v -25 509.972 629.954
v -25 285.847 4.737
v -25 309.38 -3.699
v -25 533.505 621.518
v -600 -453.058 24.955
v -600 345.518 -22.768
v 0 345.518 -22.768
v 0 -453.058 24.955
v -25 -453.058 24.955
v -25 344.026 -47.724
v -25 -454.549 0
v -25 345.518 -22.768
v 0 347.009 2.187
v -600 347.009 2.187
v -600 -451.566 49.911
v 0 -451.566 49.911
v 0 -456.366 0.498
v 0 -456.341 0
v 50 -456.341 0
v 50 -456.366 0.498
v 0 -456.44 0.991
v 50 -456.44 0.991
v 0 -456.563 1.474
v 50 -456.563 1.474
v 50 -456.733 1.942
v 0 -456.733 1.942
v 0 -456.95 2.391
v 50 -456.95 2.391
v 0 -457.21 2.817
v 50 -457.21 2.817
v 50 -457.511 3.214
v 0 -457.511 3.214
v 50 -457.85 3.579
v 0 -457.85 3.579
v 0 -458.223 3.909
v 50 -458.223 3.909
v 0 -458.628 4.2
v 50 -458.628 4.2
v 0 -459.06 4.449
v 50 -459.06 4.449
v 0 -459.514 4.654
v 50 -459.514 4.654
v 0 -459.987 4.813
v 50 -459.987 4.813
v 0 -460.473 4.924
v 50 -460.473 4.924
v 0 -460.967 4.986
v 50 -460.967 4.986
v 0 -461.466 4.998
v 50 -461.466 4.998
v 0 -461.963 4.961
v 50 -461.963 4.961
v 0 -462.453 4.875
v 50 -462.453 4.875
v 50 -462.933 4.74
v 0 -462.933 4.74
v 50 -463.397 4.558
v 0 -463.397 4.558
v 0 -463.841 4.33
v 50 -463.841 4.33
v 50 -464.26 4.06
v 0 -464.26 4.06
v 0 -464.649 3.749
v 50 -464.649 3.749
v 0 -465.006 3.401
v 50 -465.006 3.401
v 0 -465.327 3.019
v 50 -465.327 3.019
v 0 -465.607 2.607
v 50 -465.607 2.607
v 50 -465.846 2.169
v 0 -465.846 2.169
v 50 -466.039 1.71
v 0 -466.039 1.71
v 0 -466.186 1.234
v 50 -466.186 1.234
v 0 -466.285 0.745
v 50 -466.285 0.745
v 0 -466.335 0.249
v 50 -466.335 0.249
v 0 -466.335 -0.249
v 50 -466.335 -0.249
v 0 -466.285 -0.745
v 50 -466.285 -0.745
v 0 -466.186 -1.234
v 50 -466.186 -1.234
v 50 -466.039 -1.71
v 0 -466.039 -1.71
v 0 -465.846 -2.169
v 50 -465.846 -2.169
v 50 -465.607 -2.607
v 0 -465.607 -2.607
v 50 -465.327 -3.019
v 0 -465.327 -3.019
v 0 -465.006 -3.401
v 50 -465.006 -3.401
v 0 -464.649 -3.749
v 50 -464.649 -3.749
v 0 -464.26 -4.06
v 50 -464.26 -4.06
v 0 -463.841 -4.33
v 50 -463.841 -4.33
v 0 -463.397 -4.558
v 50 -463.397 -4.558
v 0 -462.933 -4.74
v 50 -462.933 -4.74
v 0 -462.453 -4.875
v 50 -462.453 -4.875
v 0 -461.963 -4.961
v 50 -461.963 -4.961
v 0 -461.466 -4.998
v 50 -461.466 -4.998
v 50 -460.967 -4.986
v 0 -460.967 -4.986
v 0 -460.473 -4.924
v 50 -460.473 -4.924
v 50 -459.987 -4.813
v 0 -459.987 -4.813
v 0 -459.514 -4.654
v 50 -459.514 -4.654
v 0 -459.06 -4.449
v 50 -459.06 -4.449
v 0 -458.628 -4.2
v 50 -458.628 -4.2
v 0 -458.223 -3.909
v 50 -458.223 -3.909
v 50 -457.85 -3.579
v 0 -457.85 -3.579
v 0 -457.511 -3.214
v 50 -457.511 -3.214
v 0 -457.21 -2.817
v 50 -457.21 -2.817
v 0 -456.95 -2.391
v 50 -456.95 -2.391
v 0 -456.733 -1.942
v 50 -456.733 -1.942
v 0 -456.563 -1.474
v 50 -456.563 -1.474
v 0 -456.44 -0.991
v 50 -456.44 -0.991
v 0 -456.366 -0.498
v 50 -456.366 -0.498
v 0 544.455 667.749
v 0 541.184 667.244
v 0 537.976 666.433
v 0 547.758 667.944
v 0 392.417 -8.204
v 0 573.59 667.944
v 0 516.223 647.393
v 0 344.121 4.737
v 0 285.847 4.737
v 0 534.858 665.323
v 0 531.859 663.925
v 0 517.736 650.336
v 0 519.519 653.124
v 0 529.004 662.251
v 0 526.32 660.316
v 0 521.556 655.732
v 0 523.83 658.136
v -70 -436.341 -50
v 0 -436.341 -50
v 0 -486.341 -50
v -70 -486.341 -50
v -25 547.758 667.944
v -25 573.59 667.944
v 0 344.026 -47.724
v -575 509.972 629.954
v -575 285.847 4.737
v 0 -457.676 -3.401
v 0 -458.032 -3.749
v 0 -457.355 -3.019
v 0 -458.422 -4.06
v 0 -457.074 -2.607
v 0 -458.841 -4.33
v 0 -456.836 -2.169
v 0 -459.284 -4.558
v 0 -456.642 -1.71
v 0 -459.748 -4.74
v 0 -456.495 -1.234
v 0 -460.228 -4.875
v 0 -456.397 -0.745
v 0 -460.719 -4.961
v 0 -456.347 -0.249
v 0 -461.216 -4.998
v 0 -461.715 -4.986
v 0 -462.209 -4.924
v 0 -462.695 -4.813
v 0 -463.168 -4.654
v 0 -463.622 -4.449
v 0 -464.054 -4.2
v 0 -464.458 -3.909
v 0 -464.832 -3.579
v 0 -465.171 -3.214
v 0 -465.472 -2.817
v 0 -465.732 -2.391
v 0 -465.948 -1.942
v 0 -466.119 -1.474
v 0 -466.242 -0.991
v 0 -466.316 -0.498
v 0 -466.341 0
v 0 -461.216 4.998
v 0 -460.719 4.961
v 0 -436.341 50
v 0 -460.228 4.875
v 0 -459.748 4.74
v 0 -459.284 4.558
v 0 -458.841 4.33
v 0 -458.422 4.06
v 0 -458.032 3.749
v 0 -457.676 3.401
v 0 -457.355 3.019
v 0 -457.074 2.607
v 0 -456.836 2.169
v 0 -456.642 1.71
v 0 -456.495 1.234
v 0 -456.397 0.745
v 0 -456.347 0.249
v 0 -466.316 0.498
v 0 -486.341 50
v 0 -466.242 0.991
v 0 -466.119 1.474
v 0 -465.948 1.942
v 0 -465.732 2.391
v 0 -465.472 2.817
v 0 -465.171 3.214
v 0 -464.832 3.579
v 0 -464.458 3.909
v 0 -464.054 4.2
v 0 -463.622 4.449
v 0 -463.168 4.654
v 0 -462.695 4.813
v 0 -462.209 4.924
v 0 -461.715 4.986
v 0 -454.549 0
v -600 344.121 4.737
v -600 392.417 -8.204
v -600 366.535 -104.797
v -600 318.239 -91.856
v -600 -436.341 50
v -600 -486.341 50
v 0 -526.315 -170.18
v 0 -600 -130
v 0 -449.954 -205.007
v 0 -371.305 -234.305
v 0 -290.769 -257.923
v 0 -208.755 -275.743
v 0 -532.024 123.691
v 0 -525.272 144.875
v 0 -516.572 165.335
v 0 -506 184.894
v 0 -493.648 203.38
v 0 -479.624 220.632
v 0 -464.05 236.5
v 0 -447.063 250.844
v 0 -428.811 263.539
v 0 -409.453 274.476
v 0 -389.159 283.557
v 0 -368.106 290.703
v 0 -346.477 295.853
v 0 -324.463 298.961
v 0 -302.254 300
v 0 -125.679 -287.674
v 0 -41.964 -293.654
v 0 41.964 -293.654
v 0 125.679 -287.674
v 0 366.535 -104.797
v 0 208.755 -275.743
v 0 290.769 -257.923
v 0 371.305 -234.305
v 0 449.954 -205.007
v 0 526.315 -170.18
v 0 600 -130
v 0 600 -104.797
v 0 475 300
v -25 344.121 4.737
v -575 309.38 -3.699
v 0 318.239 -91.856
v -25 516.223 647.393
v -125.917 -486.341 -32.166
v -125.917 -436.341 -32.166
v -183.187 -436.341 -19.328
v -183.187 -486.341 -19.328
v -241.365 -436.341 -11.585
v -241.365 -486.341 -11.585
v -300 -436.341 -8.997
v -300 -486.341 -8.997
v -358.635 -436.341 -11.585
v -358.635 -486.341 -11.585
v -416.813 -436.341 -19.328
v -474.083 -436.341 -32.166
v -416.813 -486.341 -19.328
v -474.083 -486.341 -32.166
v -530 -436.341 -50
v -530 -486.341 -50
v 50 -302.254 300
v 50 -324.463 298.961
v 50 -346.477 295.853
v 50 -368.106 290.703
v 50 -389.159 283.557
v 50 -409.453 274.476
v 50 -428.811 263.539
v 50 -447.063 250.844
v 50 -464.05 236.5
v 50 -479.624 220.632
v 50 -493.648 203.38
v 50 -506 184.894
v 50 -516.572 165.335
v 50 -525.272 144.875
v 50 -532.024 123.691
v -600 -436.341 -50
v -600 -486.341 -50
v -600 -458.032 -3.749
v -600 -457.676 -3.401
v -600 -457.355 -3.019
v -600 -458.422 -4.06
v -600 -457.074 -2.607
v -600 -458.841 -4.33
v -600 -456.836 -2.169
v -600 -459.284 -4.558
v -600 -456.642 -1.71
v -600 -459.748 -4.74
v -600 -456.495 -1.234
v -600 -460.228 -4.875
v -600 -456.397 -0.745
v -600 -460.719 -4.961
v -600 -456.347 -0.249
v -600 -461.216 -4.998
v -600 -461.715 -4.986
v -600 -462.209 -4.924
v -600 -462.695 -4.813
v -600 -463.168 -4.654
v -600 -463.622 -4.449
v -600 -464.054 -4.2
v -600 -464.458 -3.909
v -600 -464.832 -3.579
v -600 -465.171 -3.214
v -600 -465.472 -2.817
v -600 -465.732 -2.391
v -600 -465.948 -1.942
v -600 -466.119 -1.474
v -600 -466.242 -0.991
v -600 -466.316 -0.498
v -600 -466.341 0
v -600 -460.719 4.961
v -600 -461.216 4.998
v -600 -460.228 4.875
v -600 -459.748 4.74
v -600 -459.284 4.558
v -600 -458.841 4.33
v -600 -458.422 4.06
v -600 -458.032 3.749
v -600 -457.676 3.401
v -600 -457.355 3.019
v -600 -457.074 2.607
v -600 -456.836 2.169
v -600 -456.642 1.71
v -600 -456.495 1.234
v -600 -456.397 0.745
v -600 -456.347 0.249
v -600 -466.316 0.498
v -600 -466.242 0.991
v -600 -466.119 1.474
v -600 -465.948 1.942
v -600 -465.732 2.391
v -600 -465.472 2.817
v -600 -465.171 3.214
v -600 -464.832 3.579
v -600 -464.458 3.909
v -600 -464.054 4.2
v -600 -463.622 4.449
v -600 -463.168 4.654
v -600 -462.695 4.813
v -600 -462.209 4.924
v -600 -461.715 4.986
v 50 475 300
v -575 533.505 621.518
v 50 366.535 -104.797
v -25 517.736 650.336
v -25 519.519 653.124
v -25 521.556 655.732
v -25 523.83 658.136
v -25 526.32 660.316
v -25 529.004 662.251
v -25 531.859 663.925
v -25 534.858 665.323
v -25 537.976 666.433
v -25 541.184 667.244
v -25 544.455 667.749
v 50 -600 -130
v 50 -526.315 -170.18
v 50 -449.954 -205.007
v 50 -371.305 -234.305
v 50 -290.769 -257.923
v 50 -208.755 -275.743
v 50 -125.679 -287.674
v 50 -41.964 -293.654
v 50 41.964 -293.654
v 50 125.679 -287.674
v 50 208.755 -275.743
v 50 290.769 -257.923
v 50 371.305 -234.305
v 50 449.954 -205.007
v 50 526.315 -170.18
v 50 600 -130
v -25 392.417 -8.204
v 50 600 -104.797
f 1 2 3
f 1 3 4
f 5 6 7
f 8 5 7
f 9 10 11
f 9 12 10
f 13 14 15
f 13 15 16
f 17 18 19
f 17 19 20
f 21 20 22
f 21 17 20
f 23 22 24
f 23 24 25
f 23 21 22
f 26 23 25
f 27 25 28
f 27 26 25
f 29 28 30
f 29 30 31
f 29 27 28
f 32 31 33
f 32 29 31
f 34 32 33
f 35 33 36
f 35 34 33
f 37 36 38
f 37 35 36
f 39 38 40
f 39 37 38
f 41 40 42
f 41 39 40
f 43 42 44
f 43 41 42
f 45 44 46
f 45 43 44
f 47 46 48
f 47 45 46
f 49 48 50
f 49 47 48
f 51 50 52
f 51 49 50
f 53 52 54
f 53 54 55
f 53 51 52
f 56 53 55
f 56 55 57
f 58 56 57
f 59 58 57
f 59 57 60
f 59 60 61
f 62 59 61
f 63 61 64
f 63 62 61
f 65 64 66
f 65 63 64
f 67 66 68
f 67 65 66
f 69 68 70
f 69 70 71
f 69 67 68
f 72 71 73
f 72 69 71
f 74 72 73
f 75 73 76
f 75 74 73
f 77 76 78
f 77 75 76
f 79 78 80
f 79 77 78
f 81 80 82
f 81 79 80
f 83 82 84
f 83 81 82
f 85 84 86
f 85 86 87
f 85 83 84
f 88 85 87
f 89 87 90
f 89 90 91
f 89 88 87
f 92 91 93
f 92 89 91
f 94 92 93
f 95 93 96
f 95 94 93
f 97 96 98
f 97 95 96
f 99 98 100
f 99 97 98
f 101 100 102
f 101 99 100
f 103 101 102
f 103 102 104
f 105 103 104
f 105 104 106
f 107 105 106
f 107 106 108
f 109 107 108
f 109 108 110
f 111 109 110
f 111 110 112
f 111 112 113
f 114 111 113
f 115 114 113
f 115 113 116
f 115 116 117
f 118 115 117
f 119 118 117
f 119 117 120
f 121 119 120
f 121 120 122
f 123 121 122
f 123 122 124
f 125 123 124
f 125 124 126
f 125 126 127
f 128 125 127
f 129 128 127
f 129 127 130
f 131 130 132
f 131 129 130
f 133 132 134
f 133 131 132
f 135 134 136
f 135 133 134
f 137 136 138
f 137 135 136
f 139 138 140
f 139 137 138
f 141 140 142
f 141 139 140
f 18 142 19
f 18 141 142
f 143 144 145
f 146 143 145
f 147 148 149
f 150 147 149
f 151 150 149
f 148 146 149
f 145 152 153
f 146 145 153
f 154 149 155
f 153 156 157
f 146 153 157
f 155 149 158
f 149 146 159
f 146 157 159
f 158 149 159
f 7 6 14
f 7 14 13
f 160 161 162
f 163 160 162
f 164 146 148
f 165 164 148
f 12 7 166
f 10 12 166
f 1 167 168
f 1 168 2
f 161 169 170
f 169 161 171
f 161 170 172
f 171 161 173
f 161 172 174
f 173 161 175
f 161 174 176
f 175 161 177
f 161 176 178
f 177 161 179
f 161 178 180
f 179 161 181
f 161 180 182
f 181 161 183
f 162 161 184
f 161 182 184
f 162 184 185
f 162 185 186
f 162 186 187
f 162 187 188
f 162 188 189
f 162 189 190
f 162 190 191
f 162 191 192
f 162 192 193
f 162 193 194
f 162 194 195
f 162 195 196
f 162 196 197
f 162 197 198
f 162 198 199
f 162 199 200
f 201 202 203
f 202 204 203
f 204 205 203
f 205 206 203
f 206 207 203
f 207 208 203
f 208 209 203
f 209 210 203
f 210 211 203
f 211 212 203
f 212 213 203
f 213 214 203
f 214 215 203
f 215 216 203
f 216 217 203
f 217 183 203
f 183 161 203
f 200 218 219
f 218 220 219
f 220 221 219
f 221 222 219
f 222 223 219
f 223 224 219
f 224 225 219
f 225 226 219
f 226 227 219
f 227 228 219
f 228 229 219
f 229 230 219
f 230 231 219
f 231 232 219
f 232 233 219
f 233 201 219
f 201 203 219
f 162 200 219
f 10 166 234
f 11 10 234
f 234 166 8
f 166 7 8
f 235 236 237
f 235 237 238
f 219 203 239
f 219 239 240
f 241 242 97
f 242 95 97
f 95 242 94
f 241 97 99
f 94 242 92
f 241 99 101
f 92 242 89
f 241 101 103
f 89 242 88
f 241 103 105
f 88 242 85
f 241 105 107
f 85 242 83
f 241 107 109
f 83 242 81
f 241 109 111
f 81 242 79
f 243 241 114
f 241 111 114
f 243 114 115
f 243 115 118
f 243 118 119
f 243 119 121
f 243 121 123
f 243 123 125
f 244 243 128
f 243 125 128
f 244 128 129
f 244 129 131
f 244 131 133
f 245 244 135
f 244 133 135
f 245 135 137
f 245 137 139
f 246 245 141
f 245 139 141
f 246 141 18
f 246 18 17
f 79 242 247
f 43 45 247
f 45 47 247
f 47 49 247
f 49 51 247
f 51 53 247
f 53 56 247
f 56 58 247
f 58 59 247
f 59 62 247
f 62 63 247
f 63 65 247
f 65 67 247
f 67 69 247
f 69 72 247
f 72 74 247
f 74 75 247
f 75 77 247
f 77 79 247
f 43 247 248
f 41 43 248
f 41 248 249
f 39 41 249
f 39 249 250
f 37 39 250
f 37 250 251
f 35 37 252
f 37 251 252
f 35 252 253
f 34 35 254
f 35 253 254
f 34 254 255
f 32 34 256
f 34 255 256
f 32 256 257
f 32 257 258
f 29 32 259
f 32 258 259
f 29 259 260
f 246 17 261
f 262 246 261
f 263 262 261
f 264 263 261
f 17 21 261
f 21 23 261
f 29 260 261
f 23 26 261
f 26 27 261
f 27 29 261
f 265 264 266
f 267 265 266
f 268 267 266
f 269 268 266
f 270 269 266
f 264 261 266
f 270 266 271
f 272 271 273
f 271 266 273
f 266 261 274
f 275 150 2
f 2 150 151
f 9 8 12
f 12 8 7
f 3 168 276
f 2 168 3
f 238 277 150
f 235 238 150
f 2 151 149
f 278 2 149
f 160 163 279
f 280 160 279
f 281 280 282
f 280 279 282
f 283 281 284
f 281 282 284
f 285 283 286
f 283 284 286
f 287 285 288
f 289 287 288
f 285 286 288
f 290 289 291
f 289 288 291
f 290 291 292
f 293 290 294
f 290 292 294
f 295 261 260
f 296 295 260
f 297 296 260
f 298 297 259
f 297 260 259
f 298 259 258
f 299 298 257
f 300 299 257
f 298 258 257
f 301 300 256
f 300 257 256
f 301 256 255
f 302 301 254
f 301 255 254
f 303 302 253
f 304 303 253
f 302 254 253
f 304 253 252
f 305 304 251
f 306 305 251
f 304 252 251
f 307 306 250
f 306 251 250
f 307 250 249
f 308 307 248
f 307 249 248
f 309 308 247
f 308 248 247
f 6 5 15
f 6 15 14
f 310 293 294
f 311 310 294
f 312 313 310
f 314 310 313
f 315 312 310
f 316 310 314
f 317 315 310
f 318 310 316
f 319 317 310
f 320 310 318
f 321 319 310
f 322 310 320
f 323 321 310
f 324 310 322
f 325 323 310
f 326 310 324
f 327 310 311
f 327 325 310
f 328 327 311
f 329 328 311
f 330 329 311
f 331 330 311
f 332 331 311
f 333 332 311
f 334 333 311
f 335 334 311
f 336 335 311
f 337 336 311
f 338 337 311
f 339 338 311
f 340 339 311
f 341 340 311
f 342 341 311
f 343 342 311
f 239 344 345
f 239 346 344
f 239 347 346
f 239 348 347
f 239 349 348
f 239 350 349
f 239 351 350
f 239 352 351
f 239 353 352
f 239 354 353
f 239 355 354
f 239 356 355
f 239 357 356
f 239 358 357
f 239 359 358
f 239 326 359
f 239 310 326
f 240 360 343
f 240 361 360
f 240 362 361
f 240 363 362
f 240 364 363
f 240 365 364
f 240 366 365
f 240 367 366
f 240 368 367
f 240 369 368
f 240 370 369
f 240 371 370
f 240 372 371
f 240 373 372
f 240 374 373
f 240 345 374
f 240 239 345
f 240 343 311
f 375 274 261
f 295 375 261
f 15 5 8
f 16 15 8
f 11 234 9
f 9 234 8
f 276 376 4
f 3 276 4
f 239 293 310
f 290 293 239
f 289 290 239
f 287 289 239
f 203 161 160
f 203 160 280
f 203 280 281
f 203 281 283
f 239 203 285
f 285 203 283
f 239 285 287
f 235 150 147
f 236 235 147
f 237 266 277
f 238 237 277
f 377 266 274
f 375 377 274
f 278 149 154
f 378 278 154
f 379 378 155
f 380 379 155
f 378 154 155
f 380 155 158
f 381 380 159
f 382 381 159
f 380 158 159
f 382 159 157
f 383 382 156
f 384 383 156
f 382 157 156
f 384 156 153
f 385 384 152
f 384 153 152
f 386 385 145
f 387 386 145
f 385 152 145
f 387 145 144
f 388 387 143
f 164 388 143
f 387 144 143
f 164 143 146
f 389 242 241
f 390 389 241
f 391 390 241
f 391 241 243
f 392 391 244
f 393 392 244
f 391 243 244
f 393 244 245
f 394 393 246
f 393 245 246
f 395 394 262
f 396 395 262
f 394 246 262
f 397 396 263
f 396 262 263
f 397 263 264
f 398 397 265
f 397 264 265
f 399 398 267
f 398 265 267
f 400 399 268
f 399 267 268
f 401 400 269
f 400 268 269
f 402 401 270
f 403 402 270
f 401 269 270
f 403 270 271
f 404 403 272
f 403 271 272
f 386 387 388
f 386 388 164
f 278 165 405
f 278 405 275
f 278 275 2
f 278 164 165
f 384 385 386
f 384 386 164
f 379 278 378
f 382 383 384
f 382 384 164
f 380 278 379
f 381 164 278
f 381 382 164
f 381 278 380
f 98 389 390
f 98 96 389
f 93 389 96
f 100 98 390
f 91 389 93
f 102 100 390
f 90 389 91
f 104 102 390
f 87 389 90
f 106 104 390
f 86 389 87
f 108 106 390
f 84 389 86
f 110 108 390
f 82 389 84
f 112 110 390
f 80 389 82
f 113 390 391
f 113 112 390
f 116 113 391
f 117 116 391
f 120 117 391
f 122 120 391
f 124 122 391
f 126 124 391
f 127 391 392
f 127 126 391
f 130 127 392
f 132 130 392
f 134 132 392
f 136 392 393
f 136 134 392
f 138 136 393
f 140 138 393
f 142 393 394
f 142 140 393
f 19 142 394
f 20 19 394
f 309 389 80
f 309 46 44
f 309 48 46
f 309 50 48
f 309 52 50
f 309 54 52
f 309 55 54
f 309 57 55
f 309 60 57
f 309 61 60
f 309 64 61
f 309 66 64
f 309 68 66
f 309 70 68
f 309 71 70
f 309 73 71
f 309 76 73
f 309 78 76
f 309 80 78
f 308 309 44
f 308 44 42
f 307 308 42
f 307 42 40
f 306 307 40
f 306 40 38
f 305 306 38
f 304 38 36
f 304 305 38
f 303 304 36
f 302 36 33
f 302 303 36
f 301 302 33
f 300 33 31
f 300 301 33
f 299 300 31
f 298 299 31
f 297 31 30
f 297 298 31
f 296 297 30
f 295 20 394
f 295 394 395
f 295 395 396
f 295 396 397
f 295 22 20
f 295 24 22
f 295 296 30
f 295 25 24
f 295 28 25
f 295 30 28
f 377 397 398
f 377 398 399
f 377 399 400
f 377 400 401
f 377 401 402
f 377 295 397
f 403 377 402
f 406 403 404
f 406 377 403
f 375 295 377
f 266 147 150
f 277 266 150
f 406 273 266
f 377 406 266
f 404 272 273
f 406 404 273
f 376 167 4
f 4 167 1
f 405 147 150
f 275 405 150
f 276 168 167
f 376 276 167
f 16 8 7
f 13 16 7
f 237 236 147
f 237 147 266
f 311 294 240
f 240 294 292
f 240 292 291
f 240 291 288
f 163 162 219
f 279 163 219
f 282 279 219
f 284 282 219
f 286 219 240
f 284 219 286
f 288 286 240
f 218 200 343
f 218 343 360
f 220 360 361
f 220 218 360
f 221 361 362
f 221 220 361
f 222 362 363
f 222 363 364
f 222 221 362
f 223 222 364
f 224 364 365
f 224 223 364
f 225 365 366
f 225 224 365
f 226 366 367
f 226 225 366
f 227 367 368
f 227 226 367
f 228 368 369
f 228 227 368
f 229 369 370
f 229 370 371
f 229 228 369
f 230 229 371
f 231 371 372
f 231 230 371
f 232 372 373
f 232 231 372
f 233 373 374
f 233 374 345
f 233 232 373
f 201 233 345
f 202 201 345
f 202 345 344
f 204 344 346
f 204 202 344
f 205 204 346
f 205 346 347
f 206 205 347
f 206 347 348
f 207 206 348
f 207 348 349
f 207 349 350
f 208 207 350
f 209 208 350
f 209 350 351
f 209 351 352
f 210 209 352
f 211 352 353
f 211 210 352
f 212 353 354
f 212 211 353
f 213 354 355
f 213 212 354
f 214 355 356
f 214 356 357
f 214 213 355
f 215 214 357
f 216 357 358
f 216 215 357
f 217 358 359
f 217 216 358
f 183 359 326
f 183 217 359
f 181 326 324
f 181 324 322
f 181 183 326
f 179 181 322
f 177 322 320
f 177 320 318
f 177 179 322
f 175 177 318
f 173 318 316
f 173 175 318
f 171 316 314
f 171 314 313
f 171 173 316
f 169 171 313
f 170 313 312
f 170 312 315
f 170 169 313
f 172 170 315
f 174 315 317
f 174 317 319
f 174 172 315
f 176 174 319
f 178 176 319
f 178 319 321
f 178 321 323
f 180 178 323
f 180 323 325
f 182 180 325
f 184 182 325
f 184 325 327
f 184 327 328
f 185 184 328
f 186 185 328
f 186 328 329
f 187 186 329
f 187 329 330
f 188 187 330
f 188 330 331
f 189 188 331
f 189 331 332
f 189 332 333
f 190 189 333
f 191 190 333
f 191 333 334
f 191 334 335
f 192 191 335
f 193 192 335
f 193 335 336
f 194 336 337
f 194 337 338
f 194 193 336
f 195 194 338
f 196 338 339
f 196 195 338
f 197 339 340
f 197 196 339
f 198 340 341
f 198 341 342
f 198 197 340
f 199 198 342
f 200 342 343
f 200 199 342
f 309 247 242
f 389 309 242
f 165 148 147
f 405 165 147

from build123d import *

# Parameters (mm, degrees)
F0_R      = 5
F1_DEPTH  = 50
F2_W      = 50
F2_H      = 100
F2_R      = 5
F3_DEPTH  = 600
F5_DEPTH  = 600
F7_DEPTH  = 25
F9_DEPTH  = 25
F10_W     = 600
F10_H     = 800
F11_DEPTH = 25
F12_W     = 550
F12_H     = 664.1751467431
F13_DEPTH = 25
F15_DEPTH = 50


with BuildPart() as f1:
    # F0 (on Right) → F1 (new body)
    with BuildSketch(Plane.YZ):
        with BuildLine():
            Line((-532.0236194466, 123.6913059399), (-600, -130))
            ThreePointArc((-600, -130), (0, -294.4024066372), (600, -130))
            Line((600, -130), (600, -104.7966844847))
            Line((600, -104.7966844847), (366.5350552935, -104.7966844847))
            Line((366.5350552935, -104.7966844847), (475, 300))
            Line((475, 300), (350, 300))
            Line((350, 300), (-302.253655895, 300))
            ThreePointArc((-302.253655895, 300), (-447.0630062075, 250.8438493132), (-532.0236194466, 123.6913059399))
        make_face()
        with Locations((-461.3408744335, 0)):
            Circle(F0_R, mode=Mode.SUBTRACT)
    extrude(amount=F1_DEPTH)


with BuildPart() as f3:
    # F2 (on face) → F3 (new body)
    with BuildSketch(Plane(origin=(0, 0, 0), x_dir=(0, -1, 0), z_dir=(-1, 0, 0))):
        with Locations((461.3408744335, 0)):
            Rectangle(F2_W, F2_H)
        with Locations((461.3408744335, 0)):
            Circle(F2_R, mode=Mode.SUBTRACT)
    extrude(amount=F3_DEPTH)

    # F14 (on face) → F15 (cut)
    with BuildSketch(Plane.XZ.offset(486.3408744335)):
        with BuildLine():
            Line((-530, -50), (-70, -50))
            ThreePointArc((-70, -50), (-300, -8.9970800157), (-530, -50))
        make_face()
    extrude(amount=-F15_DEPTH, mode=Mode.SUBTRACT)


with BuildPart() as f5:
    # F4 (on face) → F5 (new body)
    with BuildSketch(Plane(origin=(0, 0, 0), x_dir=(0, -1, 0), z_dir=(-1, 0, 0))):
        Polygon((-392.4169598038, -8.2041018558), (-366.5350552935, -104.7966844847), (-318.2387639791, -91.8557322296), (-344.1206684893, 4.7368503993), align=None)
    extrude(amount=F5_DEPTH)


with BuildPart() as f7:
    # F6 (on face) → F7 (new body)
    with BuildSketch(Plane(origin=(0, 0, 0), x_dir=(0, -1, 0), z_dir=(-1, 0, 0))):
        with BuildLine():
            Line((-573.5902913755, 667.9439765465), (-475, 300))
            Line((-475, 300), (-391.6912826529, 300))
            Line((-391.6912826529, 300), (-516.2232364988, 647.3929239418))
            ThreePointArc((-516.2232364988, 647.3929239418), (-529.0040606879, 662.2512427731), (-547.7580439349, 667.9439765465))
            Line((-547.7580439349, 667.9439765465), (-548.5902913755, 667.9439765465))
            Line((-548.5902913755, 667.9439765465), (-573.5902913755, 667.9439765465))
        make_face()
        Polygon((-475, 300), (-392.4169598038, -8.2041018558), (-344.1206684893, 4.7368503993), (-285.8465909958, 4.7368503993), (-391.6912826529, 300), align=None)
    extrude(amount=F7_DEPTH)


with BuildPart() as f9:
    # F8 (on face) → F9 (new body)
    with BuildSketch(Plane(origin=(0, 0, 0), x_dir=(0, -1, 0), z_dir=(-1, 0, 0))):
        Polygon((-344.0262324481, -47.7235187982), (454.5490399925, 0), (453.05768003, 24.9554772638), (-345.5175924105, -22.7680415345), align=None)
    extrude(amount=F9_DEPTH)


with BuildPart() as f11:
    # F10 (on face) → F11 (new body)
    with BuildSketch(Plane(origin=(0, -0.1262197333, -2.112081432), x_dir=(1, 0, 0), z_dir=(0, 0.0596543985, 0.9982190906))):
        with Locations((-300, -53.739529312)):
            Rectangle(F10_W, F10_H)
    extrude(amount=F11_DEPTH)


with BuildPart() as f13:
    # F12 (on face) → F13 (new body)
    with BuildSketch(Plane(origin=(0, 251.792035893, -90.261349704), x_dir=(1, 0, 0), z_dir=(0, -0.9413438217, 0.3374489729))):
        with Locations((-300, 433.0052167552)):
            Rectangle(F12_W, F12_H)
    extrude(amount=-F13_DEPTH)


solid = Compound([f1.part, f3.part, f5.part, f7.part, f9.part, f11.part, f13.part])
